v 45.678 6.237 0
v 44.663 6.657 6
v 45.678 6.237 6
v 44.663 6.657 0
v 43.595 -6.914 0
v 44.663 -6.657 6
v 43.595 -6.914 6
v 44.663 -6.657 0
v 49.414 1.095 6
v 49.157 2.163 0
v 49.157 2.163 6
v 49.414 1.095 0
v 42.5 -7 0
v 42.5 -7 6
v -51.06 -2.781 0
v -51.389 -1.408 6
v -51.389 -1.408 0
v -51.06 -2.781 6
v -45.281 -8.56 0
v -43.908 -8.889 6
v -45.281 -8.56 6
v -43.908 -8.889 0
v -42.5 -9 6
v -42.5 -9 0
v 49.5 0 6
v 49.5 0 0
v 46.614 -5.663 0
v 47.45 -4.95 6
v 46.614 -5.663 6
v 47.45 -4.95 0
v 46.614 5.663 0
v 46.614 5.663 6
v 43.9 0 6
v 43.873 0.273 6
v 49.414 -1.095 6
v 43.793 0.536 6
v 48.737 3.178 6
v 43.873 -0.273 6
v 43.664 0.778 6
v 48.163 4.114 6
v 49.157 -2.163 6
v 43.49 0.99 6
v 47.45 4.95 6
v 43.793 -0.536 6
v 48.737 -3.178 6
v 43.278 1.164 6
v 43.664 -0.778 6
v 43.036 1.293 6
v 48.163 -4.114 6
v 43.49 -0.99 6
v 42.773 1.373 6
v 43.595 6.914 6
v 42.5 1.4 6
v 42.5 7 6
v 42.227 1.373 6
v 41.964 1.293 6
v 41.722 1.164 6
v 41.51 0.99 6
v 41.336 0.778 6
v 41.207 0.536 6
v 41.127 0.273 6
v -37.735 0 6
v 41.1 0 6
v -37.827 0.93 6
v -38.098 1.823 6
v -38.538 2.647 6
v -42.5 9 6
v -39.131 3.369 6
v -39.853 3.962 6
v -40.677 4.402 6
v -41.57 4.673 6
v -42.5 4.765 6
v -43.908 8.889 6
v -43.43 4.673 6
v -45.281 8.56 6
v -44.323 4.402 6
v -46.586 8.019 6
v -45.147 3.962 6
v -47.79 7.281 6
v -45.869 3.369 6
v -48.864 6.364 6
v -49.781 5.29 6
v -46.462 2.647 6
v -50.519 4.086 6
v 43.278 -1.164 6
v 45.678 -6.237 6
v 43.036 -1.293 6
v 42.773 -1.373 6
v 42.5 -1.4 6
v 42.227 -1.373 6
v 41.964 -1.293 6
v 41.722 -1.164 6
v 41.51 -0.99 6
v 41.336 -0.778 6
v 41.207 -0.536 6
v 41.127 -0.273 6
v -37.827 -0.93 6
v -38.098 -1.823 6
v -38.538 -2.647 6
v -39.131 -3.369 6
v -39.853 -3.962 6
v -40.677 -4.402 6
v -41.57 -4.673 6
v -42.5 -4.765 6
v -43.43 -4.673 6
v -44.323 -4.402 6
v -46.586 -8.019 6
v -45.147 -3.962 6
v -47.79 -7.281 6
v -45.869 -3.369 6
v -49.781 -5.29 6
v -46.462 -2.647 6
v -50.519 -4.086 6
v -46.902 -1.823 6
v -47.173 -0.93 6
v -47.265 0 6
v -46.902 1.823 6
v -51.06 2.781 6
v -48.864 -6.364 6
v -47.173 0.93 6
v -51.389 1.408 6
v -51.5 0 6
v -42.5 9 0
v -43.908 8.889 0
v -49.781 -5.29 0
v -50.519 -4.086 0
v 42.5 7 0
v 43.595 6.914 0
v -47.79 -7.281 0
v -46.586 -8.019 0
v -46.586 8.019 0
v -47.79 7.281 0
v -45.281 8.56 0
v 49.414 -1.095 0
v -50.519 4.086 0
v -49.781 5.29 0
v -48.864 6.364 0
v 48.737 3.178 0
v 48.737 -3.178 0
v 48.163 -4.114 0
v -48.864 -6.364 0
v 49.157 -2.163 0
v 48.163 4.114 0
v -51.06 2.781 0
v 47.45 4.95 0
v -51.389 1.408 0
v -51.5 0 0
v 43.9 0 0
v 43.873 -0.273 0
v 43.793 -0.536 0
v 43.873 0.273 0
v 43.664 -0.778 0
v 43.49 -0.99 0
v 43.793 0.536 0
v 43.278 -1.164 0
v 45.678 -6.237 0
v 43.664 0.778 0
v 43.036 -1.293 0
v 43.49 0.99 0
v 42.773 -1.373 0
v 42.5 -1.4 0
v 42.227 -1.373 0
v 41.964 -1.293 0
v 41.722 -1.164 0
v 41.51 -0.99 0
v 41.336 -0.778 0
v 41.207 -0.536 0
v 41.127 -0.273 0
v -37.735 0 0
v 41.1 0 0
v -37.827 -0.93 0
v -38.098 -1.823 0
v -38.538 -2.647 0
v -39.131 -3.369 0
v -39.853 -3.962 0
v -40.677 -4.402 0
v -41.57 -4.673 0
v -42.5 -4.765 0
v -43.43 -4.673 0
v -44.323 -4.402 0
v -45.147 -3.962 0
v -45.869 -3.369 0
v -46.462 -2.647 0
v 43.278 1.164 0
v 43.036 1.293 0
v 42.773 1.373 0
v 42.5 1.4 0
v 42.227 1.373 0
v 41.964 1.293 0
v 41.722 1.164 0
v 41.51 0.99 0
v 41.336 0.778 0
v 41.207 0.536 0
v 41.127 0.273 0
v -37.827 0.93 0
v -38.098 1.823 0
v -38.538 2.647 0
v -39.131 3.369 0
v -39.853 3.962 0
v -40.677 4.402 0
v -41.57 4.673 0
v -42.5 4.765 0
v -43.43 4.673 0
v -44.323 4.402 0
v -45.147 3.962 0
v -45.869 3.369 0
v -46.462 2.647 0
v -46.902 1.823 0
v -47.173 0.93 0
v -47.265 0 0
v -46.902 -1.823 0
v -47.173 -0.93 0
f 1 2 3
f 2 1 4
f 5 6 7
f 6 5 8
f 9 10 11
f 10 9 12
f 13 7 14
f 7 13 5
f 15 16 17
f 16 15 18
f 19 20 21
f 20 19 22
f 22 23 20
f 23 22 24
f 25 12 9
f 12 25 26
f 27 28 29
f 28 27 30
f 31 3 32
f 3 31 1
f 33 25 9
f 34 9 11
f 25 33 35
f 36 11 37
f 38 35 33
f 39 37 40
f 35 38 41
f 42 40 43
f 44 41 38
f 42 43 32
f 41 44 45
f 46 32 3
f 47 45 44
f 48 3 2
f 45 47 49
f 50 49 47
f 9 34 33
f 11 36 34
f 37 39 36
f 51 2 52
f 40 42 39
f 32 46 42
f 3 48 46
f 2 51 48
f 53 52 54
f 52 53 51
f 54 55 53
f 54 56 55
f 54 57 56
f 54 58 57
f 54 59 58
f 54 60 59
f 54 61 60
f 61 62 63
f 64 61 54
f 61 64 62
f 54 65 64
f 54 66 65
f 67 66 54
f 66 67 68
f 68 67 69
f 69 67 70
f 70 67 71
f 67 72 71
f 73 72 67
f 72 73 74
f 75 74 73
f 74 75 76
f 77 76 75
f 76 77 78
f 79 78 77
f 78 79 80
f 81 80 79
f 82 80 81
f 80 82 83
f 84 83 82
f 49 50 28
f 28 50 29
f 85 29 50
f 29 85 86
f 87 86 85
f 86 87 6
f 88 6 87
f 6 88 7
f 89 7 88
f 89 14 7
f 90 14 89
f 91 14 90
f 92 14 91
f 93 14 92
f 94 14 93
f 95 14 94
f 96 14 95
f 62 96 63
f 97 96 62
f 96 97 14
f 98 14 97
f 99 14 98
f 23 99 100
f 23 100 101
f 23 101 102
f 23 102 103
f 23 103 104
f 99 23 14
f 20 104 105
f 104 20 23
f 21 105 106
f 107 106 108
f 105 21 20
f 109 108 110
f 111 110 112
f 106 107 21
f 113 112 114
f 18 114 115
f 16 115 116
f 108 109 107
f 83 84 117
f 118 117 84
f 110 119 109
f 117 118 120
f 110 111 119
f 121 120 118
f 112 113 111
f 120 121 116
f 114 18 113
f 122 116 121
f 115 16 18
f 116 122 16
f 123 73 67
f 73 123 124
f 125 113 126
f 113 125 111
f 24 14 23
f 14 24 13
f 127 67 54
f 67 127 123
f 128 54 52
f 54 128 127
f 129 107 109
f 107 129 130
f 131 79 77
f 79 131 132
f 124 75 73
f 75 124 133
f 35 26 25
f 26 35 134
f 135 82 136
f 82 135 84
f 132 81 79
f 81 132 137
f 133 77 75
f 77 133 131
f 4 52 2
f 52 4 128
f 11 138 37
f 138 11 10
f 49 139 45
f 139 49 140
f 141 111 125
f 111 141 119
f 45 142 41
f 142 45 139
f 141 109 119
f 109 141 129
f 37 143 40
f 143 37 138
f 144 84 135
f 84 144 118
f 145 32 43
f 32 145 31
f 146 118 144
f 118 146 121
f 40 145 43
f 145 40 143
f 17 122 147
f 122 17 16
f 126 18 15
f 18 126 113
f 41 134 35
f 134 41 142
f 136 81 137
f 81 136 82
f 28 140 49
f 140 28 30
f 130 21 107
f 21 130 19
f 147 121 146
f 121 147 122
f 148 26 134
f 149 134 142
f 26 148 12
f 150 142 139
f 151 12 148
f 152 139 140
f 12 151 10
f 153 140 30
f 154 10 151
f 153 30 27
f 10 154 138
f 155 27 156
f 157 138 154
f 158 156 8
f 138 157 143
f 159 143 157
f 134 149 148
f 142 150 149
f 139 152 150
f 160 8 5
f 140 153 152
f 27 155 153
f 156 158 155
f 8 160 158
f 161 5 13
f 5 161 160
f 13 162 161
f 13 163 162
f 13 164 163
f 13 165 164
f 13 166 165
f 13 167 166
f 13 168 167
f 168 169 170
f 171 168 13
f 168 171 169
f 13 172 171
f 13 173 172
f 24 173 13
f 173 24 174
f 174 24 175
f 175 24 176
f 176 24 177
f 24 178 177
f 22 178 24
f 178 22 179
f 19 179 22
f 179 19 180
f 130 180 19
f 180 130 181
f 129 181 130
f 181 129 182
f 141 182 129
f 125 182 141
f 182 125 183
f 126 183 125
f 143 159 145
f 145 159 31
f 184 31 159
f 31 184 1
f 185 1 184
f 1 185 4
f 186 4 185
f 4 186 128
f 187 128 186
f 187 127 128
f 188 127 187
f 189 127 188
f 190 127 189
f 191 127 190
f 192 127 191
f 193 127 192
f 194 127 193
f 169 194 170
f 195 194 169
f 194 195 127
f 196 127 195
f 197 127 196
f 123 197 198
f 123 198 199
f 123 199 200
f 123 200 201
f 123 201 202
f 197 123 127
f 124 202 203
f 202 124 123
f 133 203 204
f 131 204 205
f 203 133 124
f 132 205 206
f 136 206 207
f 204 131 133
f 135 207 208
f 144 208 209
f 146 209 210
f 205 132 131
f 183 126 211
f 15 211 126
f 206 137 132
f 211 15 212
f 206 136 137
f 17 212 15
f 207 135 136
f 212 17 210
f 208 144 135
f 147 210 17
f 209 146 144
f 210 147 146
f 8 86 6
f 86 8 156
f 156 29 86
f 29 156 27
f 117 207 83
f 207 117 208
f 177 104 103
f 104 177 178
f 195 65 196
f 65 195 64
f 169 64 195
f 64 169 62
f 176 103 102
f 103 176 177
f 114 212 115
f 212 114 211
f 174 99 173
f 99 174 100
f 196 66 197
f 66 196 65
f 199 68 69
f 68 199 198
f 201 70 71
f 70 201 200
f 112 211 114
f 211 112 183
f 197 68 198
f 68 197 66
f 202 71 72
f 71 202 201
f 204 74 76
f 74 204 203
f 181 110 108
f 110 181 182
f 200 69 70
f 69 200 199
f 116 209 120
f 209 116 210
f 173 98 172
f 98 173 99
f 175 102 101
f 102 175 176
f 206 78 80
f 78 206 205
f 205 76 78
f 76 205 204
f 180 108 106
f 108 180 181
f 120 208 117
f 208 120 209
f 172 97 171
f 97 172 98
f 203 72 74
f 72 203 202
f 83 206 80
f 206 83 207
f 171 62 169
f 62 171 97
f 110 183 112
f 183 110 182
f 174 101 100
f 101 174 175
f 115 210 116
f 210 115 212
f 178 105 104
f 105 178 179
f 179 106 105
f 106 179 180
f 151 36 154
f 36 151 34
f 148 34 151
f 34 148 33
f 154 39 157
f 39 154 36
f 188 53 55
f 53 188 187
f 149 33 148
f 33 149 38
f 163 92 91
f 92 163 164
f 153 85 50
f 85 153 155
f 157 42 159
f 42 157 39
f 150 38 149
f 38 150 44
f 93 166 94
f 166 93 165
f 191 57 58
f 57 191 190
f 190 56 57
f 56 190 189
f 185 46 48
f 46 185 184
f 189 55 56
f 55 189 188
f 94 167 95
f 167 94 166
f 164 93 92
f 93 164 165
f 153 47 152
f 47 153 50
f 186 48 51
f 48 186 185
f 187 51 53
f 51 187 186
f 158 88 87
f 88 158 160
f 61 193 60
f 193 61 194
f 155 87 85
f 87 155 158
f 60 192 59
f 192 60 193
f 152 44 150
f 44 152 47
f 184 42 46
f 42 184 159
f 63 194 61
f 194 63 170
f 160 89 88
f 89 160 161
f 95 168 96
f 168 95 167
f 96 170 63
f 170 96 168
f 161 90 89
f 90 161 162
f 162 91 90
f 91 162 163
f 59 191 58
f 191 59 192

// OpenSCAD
$fn = 32;

// ----------------------------------------------------------------------
// Lever: 85 mm between the bosses, 6 mm thick, smooth outline
// ----------------------------------------------------------------------

// --- parameters (mm) ---
lever_l = 85;             // distance between the boss centres
boss_a = 18;              // first boss diameter
boss_b = 14;              // second boss diameter
bore_a = 9.53;            // first bore
bore_b = 2.8;             // second bore
lever_t = 6;              // lever thickness

lever_profile = [[-51.5, 0], [-51.389, -1.408], [-51.06, -2.781], [-50.519, -4.086], [-49.781, -5.29], [-48.864, -6.364], [-47.79, -7.281], [-46.586, -8.019], [-45.281, -8.56], [-43.908, -8.889], [-42.5, -9], [42.5, -7], [43.595, -6.914], [44.663, -6.657], [45.678, -6.237], [46.614, -5.663], [47.45, -4.95], [48.163, -4.114], [48.737, -3.178], [49.157, -2.163], [49.414, -1.095], [49.5, 0], [49.414, 1.095], [49.157, 2.163], [48.737, 3.178], [48.163, 4.114], [47.45, 4.95], [46.614, 5.663], [45.678, 6.237], [44.663, 6.657], [43.595, 6.914], [42.5, 7], [-42.5, 9], [-43.908, 8.889], [-45.281, 8.56], [-46.586, 8.019], [-47.79, 7.281], [-48.864, 6.364], [-49.781, 5.29], [-50.519, 4.086], [-51.06, 2.781], [-51.389, 1.408]];

difference() {
  linear_extrude(height = lever_t) polygon(lever_profile);
  translate([-42.5, 0, -2.5]) cylinder(h = lever_t + 5, d = bore_a);
  translate([42.5, 0, -2.5]) cylinder(h = lever_t + 5, d = bore_b);
}
